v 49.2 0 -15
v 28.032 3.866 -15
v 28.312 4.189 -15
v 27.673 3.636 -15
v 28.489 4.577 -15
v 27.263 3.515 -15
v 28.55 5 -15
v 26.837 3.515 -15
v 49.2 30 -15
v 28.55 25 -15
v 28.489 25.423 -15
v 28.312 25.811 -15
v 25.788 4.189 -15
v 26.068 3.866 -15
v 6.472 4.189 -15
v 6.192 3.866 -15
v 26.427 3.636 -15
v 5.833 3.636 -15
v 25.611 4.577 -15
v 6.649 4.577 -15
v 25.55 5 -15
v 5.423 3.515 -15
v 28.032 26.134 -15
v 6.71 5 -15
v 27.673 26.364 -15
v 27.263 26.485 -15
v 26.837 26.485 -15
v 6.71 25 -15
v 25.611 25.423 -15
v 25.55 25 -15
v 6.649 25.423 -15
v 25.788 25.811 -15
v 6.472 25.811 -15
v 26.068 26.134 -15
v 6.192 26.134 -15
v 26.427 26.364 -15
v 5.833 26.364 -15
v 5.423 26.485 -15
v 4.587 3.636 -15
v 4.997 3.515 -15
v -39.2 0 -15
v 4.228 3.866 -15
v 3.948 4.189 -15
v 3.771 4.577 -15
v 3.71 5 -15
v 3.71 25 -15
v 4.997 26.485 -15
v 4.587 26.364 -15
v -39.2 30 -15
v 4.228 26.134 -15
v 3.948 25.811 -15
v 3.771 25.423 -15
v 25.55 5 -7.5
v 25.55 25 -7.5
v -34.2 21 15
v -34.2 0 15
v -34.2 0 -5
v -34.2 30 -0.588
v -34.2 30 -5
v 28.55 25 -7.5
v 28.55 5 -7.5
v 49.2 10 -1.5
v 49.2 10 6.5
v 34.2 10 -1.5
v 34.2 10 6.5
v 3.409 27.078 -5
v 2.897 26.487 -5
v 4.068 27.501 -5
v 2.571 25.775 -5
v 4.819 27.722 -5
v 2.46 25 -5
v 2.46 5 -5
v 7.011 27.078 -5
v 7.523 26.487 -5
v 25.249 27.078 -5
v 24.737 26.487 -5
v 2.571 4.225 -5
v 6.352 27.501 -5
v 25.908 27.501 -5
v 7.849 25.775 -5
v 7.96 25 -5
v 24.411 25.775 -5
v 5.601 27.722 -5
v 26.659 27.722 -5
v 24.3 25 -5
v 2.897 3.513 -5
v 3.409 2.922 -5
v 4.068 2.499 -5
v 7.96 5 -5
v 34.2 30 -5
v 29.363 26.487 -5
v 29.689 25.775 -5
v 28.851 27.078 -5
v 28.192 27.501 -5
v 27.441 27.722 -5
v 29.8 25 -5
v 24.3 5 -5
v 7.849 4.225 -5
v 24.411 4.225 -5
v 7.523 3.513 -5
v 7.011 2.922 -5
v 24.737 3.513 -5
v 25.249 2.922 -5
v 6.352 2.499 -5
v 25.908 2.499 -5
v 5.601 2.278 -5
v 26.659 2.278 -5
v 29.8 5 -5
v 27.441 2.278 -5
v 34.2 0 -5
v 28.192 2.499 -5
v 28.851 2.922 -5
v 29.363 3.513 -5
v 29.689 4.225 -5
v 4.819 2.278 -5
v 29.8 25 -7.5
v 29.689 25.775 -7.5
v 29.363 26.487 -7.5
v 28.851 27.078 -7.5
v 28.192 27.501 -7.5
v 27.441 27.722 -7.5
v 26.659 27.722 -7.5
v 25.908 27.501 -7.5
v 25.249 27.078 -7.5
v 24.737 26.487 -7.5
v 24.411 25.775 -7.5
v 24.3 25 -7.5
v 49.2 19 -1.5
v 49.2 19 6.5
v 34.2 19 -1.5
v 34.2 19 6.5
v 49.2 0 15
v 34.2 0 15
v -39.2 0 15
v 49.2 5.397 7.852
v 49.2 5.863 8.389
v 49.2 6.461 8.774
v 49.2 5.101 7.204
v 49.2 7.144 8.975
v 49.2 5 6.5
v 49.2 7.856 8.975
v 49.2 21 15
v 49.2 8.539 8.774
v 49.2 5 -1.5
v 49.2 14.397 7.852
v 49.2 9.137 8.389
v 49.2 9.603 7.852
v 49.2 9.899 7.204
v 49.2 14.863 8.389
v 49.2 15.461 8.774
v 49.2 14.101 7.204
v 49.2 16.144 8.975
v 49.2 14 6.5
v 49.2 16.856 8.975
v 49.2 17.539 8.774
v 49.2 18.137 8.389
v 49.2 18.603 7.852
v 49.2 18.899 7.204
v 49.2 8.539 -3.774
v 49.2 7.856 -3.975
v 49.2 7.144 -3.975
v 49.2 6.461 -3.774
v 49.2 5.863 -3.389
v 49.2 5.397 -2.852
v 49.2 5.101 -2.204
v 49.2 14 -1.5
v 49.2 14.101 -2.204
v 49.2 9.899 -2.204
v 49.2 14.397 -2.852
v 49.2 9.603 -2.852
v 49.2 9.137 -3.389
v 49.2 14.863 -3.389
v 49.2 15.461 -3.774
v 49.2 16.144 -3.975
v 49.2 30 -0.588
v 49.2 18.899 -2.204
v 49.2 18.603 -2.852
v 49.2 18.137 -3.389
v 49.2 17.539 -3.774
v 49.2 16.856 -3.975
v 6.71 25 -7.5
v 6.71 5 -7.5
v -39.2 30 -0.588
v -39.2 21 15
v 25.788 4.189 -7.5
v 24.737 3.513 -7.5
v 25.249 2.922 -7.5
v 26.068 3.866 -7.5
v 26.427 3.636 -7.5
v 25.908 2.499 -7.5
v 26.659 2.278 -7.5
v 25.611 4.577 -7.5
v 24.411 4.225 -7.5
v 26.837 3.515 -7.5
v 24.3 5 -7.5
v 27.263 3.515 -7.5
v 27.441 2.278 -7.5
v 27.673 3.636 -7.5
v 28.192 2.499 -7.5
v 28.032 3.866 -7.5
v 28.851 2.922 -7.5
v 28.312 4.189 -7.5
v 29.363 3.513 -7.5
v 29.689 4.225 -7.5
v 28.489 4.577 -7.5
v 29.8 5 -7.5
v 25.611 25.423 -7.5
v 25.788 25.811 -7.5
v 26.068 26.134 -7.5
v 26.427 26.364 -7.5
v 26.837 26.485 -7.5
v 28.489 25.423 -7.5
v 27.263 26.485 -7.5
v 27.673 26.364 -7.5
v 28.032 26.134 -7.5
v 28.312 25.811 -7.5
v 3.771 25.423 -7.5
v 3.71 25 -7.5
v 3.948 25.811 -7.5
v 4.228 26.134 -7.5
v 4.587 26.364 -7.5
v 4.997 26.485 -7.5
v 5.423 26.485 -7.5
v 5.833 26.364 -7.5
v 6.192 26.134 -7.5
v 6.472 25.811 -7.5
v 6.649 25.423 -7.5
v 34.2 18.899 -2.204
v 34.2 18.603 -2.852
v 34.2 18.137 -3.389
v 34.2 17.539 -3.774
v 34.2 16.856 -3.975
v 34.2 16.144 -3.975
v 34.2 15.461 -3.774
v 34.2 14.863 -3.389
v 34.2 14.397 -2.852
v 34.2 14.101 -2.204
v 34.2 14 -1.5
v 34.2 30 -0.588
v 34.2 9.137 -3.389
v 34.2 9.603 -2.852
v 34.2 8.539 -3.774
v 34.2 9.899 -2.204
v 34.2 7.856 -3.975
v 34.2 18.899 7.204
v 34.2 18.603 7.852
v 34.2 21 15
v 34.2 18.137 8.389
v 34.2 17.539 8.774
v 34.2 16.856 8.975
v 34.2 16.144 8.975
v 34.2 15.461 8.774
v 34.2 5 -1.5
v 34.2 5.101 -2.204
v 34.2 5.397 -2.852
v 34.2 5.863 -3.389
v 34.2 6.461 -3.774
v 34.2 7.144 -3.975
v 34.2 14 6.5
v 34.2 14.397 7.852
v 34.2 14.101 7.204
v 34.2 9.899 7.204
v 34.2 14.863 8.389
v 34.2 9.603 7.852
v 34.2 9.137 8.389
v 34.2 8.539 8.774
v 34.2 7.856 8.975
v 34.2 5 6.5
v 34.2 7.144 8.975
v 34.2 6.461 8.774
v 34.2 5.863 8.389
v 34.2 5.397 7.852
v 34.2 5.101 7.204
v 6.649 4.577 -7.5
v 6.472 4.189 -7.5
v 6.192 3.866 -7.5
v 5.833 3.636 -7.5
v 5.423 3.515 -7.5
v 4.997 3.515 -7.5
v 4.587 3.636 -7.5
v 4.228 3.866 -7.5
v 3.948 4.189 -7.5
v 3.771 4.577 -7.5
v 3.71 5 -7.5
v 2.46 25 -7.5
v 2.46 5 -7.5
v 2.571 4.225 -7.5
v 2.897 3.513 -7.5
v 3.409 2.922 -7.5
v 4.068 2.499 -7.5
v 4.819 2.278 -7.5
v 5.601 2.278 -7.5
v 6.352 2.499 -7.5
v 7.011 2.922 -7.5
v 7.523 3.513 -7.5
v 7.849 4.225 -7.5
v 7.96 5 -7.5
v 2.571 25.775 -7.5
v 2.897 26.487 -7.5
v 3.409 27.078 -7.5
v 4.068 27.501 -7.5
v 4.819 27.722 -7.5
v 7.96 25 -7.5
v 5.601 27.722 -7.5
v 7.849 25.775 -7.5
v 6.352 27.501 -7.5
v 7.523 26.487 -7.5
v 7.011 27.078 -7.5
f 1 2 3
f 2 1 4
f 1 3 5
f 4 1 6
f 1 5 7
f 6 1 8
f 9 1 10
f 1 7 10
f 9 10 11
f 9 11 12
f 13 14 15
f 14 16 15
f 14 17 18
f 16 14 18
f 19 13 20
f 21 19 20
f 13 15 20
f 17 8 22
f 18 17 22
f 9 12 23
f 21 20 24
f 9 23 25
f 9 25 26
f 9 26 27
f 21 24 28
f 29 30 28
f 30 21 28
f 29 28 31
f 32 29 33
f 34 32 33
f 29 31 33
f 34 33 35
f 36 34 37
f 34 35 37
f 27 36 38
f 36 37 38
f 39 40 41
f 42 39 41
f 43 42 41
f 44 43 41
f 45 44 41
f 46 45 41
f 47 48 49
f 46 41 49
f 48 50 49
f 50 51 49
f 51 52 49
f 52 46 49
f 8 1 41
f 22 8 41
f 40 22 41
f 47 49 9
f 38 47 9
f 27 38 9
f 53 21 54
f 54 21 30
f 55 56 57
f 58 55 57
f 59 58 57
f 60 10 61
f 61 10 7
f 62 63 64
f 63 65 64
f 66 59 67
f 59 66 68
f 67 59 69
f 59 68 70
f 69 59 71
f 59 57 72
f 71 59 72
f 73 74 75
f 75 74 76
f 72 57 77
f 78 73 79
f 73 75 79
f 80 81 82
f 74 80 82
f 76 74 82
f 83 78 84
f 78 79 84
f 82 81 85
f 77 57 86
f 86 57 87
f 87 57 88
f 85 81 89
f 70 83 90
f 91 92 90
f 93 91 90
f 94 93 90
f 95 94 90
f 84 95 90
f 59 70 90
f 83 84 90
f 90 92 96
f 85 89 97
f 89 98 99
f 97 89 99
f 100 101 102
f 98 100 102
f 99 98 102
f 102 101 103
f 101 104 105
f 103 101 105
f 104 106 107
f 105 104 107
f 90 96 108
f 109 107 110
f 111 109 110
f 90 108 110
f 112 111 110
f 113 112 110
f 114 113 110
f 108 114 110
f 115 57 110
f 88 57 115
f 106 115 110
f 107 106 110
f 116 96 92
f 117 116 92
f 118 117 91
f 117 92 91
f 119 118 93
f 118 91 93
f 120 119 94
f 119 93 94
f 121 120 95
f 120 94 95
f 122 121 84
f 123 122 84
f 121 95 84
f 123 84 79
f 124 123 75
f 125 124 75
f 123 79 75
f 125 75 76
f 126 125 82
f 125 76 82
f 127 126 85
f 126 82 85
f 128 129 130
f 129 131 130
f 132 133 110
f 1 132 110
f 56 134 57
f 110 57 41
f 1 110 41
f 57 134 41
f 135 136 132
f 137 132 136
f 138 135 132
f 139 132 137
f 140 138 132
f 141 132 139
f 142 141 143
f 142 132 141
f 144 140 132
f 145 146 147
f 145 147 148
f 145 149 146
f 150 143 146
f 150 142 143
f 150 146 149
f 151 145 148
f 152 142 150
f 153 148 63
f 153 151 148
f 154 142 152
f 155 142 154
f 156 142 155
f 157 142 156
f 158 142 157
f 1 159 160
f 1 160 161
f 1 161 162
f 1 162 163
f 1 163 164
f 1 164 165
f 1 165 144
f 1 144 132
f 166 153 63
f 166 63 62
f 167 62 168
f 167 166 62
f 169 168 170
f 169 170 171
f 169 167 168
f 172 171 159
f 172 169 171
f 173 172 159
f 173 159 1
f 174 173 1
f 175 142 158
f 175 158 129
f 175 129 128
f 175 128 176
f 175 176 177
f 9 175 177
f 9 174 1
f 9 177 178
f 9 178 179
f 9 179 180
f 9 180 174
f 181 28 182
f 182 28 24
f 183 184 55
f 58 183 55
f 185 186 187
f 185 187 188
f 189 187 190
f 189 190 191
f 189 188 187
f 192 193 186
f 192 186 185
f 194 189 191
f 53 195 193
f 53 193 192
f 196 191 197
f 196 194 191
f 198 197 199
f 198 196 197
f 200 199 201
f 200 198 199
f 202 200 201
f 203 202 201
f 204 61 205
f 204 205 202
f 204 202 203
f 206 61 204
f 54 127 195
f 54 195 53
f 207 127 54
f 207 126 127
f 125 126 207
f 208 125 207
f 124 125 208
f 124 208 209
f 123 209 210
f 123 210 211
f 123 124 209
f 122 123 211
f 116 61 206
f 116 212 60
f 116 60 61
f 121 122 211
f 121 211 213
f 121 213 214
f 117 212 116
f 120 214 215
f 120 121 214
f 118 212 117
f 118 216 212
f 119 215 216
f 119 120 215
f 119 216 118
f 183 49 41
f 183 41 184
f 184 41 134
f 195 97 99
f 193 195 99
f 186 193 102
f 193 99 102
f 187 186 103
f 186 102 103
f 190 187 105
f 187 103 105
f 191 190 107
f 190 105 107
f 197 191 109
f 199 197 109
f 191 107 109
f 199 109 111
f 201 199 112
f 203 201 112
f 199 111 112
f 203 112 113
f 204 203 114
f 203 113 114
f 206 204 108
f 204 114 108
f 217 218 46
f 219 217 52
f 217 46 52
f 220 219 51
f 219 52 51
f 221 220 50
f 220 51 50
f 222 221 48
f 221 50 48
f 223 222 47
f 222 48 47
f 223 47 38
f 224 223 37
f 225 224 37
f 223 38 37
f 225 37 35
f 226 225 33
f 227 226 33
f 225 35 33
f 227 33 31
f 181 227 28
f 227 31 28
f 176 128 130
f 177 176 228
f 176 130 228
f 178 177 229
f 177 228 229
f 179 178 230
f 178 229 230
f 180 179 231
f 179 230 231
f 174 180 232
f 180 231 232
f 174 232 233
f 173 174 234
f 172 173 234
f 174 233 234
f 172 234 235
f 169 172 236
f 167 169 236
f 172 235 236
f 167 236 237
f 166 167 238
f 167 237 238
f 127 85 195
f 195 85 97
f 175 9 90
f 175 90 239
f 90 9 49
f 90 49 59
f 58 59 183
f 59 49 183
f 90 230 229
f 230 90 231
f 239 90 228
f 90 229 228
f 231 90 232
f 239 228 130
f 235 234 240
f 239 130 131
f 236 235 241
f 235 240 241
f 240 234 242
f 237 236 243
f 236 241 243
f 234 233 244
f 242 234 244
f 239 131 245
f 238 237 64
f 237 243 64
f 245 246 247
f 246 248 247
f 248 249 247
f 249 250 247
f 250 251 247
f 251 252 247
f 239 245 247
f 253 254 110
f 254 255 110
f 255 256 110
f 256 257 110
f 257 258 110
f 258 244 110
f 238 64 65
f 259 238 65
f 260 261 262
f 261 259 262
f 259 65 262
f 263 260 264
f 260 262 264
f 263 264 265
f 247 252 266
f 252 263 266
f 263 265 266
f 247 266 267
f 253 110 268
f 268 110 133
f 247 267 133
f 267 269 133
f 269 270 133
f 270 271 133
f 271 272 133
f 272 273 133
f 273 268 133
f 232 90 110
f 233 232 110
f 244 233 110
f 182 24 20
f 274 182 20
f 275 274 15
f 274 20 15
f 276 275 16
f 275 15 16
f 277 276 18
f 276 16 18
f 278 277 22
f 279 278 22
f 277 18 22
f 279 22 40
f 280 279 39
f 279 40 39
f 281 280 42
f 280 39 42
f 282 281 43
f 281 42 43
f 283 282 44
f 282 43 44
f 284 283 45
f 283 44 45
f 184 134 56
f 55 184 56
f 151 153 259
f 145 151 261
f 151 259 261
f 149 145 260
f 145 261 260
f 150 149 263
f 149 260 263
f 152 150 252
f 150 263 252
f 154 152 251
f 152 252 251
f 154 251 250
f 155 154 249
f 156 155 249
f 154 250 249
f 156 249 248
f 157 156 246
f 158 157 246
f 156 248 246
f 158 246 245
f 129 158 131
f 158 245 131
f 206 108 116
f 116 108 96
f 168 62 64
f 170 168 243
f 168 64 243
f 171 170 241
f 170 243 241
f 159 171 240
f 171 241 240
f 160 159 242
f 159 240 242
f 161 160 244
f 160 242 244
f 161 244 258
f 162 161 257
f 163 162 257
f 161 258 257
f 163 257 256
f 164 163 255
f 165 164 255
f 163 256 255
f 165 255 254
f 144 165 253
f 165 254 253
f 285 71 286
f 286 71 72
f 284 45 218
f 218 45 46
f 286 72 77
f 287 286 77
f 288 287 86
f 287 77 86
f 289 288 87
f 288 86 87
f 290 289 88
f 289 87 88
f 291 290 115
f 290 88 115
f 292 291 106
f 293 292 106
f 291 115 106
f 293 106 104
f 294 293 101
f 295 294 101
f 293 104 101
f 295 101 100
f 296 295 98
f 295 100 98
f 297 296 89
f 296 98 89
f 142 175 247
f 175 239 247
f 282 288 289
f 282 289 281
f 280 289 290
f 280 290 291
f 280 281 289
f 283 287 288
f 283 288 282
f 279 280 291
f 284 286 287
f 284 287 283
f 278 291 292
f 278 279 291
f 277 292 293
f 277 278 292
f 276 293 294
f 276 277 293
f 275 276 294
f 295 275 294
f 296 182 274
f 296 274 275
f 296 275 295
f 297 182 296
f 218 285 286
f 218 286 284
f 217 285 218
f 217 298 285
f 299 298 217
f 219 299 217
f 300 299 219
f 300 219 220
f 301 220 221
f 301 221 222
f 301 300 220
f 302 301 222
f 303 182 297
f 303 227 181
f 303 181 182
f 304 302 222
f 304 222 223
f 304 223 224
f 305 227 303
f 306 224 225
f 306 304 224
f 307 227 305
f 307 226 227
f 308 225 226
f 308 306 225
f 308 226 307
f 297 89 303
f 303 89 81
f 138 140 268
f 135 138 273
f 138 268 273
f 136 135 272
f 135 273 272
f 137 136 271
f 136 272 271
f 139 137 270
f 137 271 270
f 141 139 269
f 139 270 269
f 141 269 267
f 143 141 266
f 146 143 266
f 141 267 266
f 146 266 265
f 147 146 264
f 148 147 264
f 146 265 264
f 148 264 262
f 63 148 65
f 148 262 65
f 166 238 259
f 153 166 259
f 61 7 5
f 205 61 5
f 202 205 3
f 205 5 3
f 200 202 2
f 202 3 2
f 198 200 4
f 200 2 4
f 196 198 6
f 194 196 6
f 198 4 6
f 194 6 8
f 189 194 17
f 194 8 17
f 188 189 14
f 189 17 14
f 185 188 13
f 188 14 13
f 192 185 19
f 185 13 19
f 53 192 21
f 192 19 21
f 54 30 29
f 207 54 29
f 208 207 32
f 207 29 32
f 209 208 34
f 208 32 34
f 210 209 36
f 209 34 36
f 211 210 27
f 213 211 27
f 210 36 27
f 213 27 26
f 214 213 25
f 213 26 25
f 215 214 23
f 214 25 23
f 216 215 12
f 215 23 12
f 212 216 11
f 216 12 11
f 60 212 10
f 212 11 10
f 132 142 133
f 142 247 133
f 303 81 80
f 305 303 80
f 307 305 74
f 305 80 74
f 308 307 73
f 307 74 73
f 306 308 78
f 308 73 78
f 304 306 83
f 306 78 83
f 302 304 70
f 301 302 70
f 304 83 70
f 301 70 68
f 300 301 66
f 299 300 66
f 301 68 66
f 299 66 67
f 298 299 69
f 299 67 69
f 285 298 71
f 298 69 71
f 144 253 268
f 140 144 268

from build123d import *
from OCP.BRepFilletAPI import BRepFilletAPI_MakeChamfer

# Parameters (mm, degrees)
BOSS_EXTRUDE1_DEPTH = 30
CUT_EXTRUDE1_REACH  = 87.273
CHAMFER1_SIZE       = 9
CHAMFER1_SIZE2      = 15.588457268
BOSS_EXTRUDE8_DEPTH = 10
CUT_EXTRUDE2_REACH  = 66.966
CUT_EXTRUDE3_DEPTH  = 2.5


with BuildPart() as part:
    # Sketch1 → Boss-Extrude1 (new body)
    with BuildSketch(Plane(origin=(0, 0, 0), x_dir=(1, 0, 0), z_dir=(0, 1, 0))):
        Polygon((39.2, 15), (-39.2, 15), (-39.2, -15), (-34.2, -15), (-34.2, 5), (34.2, 5), (34.2, -15), (39.2, -15), align=None)
    extrude(amount=BOSS_EXTRUDE1_DEPTH)

    # Sketch2 → Cut-Extrude1 (cut, up to next)
    with BuildSketch(Plane(origin=(39.2, 0, 0), x_dir=(0, 0, -1), z_dir=(1, 0, 0)), mode=Mode.PRIVATE) as cut_extrude1_sk1:
        with BuildLine():
            Line((-6.5, 10), (1.5, 10))
            ThreePointArc((1.5, 10), (4, 7.5), (1.5, 5))
            Line((1.5, 5), (-6.5, 5))
            ThreePointArc((-6.5, 5), (-9, 7.5), (-6.5, 10))
        make_face()
    cut_extrude1_tool1 = extrude(cut_extrude1_sk1.sketch, amount=-CUT_EXTRUDE1_REACH, mode=Mode.PRIVATE) & part.part
    # Sketch2 → Cut-Extrude1 (cut, up to next)
    with BuildSketch(Plane(origin=(39.2, 0, 0), x_dir=(0, 0, -1), z_dir=(1, 0, 0)), mode=Mode.PRIVATE) as cut_extrude1_sk2:
        with BuildLine():
            Line((-6.5, 19), (1.5, 19))
            ThreePointArc((1.5, 19), (4, 16.5), (1.5, 14))
            Line((1.5, 14), (-6.5, 14))
            ThreePointArc((-6.5, 14), (-9, 16.5), (-6.5, 19))
        make_face()
    cut_extrude1_tool2 = extrude(cut_extrude1_sk2.sketch, amount=-CUT_EXTRUDE1_REACH, mode=Mode.PRIVATE) & part.part
    add(cut_extrude1_tool1.solids().sort_by_distance((39.2, 7.5, 2.5))[0], mode=Mode.SUBTRACT)
    add(cut_extrude1_tool2.solids().sort_by_distance((39.2, 16.5, 2.5))[0], mode=Mode.SUBTRACT)

    # Chamfer1: one chamfer whose edges measure the first distance from different faces: ONE call of the kernel's chamfer builder (chamfer() names one face for all edges)
    chamfer1_edges_1 = [part.edges().sort_by_distance(p)[0] for p in [
        (36.7, 30, 15),
    ]]
    chamfer1_side_1 = [part.faces().sort_by_distance(p)[0] for p in [
        (36.7, 15, 15),
    ]]
    chamfer1_edges_2 = [part.edges().sort_by_distance(p)[0] for p in [
        (-36.7, 30, 15),
    ]]
    chamfer1_side_2 = [part.faces().sort_by_distance(p)[0] for p in [
        (-36.7, 15, 15),
    ]]
    chamfer1 = BRepFilletAPI_MakeChamfer(part.part.solid().wrapped)
    for e in chamfer1_edges_1:
        chamfer1.Add(CHAMFER1_SIZE, CHAMFER1_SIZE2, e.wrapped, chamfer1_side_1[0].wrapped)  # the first distance lies on this face
    for e in chamfer1_edges_2:
        chamfer1.Add(CHAMFER1_SIZE, CHAMFER1_SIZE2, e.wrapped, chamfer1_side_2[0].wrapped)  # the first distance lies on this face
    add(Compound.cast(chamfer1.Shape()), mode=Mode.REPLACE)

    # Sketch8 → Boss-Extrude8 (add)
    with BuildSketch(Plane(origin=(39.2, 0, 0), x_dir=(0, 0, -1), z_dir=(1, 0, 0))):
        Polygon((15, 30), (0.588457268, 30), (-15, 21), (-15, 0), (15, 0), align=None)
        with BuildLine():
            Line((-6.5, 19), (1.5, 19))
            ThreePointArc((1.5, 19), (4, 16.5), (1.5, 14))
            Line((1.5, 14), (-6.5, 14))
            ThreePointArc((-6.5, 14), (-9, 16.5), (-6.5, 19))
        make_face(mode=Mode.SUBTRACT)
        with BuildLine():
            Line((-6.5, 10), (1.5, 10))
            ThreePointArc((1.5, 10), (4, 7.5), (1.5, 5))
            Line((1.5, 5), (-6.5, 5))
            ThreePointArc((-6.5, 5), (-9, 7.5), (-6.5, 10))
        make_face(mode=Mode.SUBTRACT)
    extrude(amount=BOSS_EXTRUDE8_DEPTH)

    # Sketch9 → Cut-Extrude2 (cut, up to next)
    with BuildSketch(Plane(origin=(0, 0, -15), x_dir=(-1, 0, 0), z_dir=(0, 0, -1)), mode=Mode.PRIVATE) as cut_extrude2_sk1:
        with BuildLine():
            ThreePointArc((-25.55, 25), (-27.05, 23.5), (-28.55, 25))
            Line((-28.55, 25), (-28.55, 5))
            ThreePointArc((-28.55, 5), (-27.05, 6.5), (-25.55, 5))
            Line((-25.55, 5), (-25.55, 25))
        make_face()
    cut_extrude2_tool1 = extrude(cut_extrude2_sk1.sketch, amount=-CUT_EXTRUDE2_REACH, mode=Mode.PRIVATE) & part.part
    # Sketch9 → Cut-Extrude2 (cut, up to next)
    with BuildSketch(Plane(origin=(0, 0, -15), x_dir=(-1, 0, 0), z_dir=(0, 0, -1)), mode=Mode.PRIVATE) as cut_extrude2_sk2:
        with BuildLine():
            ThreePointArc((-25.55, 25), (-27.05, 26.5), (-28.55, 25))
            Line((-28.55, 25), (-25.55, 25))
        make_face()
    cut_extrude2_tool2 = extrude(cut_extrude2_sk2.sketch, amount=-CUT_EXTRUDE2_REACH, mode=Mode.PRIVATE) & part.part
    # Sketch9 → Cut-Extrude2 (cut, up to next)
    with BuildSketch(Plane(origin=(0, 0, -15), x_dir=(-1, 0, 0), z_dir=(0, 0, -1)), mode=Mode.PRIVATE) as cut_extrude2_sk3:
        with BuildLine():
            Line((-25.55, 25), (-28.55, 25))
            ThreePointArc((-28.55, 25), (-27.05, 23.5), (-25.55, 25))
        make_face()
    cut_extrude2_tool3 = extrude(cut_extrude2_sk3.sketch, amount=-CUT_EXTRUDE2_REACH, mode=Mode.PRIVATE) & part.part
    # Sketch9 → Cut-Extrude2 (cut, up to next)
    with BuildSketch(Plane(origin=(0, 0, -15), x_dir=(-1, 0, 0), z_dir=(0, 0, -1)), mode=Mode.PRIVATE) as cut_extrude2_sk4:
        with BuildLine():
            ThreePointArc((-3.71, 25), (-5.21, 26.5), (-6.71, 25))
            Line((-6.71, 25), (-3.71, 25))
        make_face()
    cut_extrude2_tool4 = extrude(cut_extrude2_sk4.sketch, amount=-CUT_EXTRUDE2_REACH, mode=Mode.PRIVATE) & part.part
    # Sketch9 → Cut-Extrude2 (cut, up to next)
    with BuildSketch(Plane(origin=(0, 0, -15), x_dir=(-1, 0, 0), z_dir=(0, 0, -1)), mode=Mode.PRIVATE) as cut_extrude2_sk5:
        with BuildLine():
            Line((-3.71, 25), (-6.71, 25))
            ThreePointArc((-6.71, 25), (-5.21, 23.5), (-3.71, 25))
        make_face()
    cut_extrude2_tool5 = extrude(cut_extrude2_sk5.sketch, amount=-CUT_EXTRUDE2_REACH, mode=Mode.PRIVATE) & part.part
    # Sketch9 → Cut-Extrude2 (cut, up to next)
    with BuildSketch(Plane(origin=(0, 0, -15), x_dir=(-1, 0, 0), z_dir=(0, 0, -1)), mode=Mode.PRIVATE) as cut_extrude2_sk6:
        with BuildLine():
            ThreePointArc((-3.71, 25), (-5.21, 23.5), (-6.71, 25))
            Line((-6.71, 25), (-6.71, 5))
            ThreePointArc((-6.71, 5), (-5.21, 6.5), (-3.71, 5))
            Line((-3.71, 5), (-3.71, 25))
        make_face()
    cut_extrude2_tool6 = extrude(cut_extrude2_sk6.sketch, amount=-CUT_EXTRUDE2_REACH, mode=Mode.PRIVATE) & part.part
    # Sketch9 → Cut-Extrude2 (cut, up to next)
    with BuildSketch(Plane(origin=(0, 0, -15), x_dir=(-1, 0, 0), z_dir=(0, 0, -1)), mode=Mode.PRIVATE) as cut_extrude2_sk7:
        with BuildLine():
            ThreePointArc((-3.71, 25), (-5.21, 26.5), (-6.71, 25))
            Line((-6.71, 25), (-3.71, 25))
        make_face()
    cut_extrude2_tool7 = extrude(cut_extrude2_sk7.sketch, amount=-CUT_EXTRUDE2_REACH, mode=Mode.PRIVATE) & part.part
    # Sketch9 → Cut-Extrude2 (cut, up to next)
    with BuildSketch(Plane(origin=(0, 0, -15), x_dir=(-1, 0, 0), z_dir=(0, 0, -1)), mode=Mode.PRIVATE) as cut_extrude2_sk8:
        with BuildLine():
            Line((-3.71, 25), (-6.71, 25))
            ThreePointArc((-6.71, 25), (-5.21, 23.5), (-3.71, 25))
        make_face()
    cut_extrude2_tool8 = extrude(cut_extrude2_sk8.sketch, amount=-CUT_EXTRUDE2_REACH, mode=Mode.PRIVATE) & part.part
    # Sketch9 → Cut-Extrude2 (cut, up to next)
    with BuildSketch(Plane(origin=(0, 0, -15), x_dir=(-1, 0, 0), z_dir=(0, 0, -1)), mode=Mode.PRIVATE) as cut_extrude2_sk9:
        with BuildLine():
            ThreePointArc((-25.55, 25), (-27.05, 26.5), (-28.55, 25))
            Line((-28.55, 25), (-25.55, 25))
        make_face()
    cut_extrude2_tool9 = extrude(cut_extrude2_sk9.sketch, amount=-CUT_EXTRUDE2_REACH, mode=Mode.PRIVATE) & part.part
    # Sketch9 → Cut-Extrude2 (cut, up to next)
    with BuildSketch(Plane(origin=(0, 0, -15), x_dir=(-1, 0, 0), z_dir=(0, 0, -1)), mode=Mode.PRIVATE) as cut_extrude2_sk10:
        with BuildLine():
            Line((-25.55, 25), (-28.55, 25))
            ThreePointArc((-28.55, 25), (-27.05, 23.5), (-25.55, 25))
        make_face()
    cut_extrude2_tool10 = extrude(cut_extrude2_sk10.sketch, amount=-CUT_EXTRUDE2_REACH, mode=Mode.PRIVATE) & part.part
    # Sketch9 → Cut-Extrude2 (cut, up to next)
    with BuildSketch(Plane(origin=(0, 0, -15), x_dir=(-1, 0, 0), z_dir=(0, 0, -1)), mode=Mode.PRIVATE) as cut_extrude2_sk11:
        with BuildLine():
            ThreePointArc((-25.55, 5), (-27.05, 6.5), (-28.55, 5))
            Line((-28.55, 5), (-25.55, 5))
        make_face()
    cut_extrude2_tool11 = extrude(cut_extrude2_sk11.sketch, amount=-CUT_EXTRUDE2_REACH, mode=Mode.PRIVATE) & part.part
    # Sketch9 → Cut-Extrude2 (cut, up to next)
    with BuildSketch(Plane(origin=(0, 0, -15), x_dir=(-1, 0, 0), z_dir=(0, 0, -1)), mode=Mode.PRIVATE) as cut_extrude2_sk12:
        with BuildLine():
            Line((-25.55, 5), (-28.55, 5))
            ThreePointArc((-28.55, 5), (-27.05, 3.5), (-25.55, 5))
        make_face()
    cut_extrude2_tool12 = extrude(cut_extrude2_sk12.sketch, amount=-CUT_EXTRUDE2_REACH, mode=Mode.PRIVATE) & part.part
    # Sketch9 → Cut-Extrude2 (cut, up to next)
    with BuildSketch(Plane(origin=(0, 0, -15), x_dir=(-1, 0, 0), z_dir=(0, 0, -1)), mode=Mode.PRIVATE) as cut_extrude2_sk13:
        with BuildLine():
            ThreePointArc((-25.55, 5), (-27.05, 6.5), (-28.55, 5))
            Line((-28.55, 5), (-25.55, 5))
        make_face()
    cut_extrude2_tool13 = extrude(cut_extrude2_sk13.sketch, amount=-CUT_EXTRUDE2_REACH, mode=Mode.PRIVATE) & part.part
    # Sketch9 → Cut-Extrude2 (cut, up to next)
    with BuildSketch(Plane(origin=(0, 0, -15), x_dir=(-1, 0, 0), z_dir=(0, 0, -1)), mode=Mode.PRIVATE) as cut_extrude2_sk14:
        with BuildLine():
            Line((-25.55, 5), (-28.55, 5))
            ThreePointArc((-28.55, 5), (-27.05, 3.5), (-25.55, 5))
        make_face()
    cut_extrude2_tool14 = extrude(cut_extrude2_sk14.sketch, amount=-CUT_EXTRUDE2_REACH, mode=Mode.PRIVATE) & part.part
    # Sketch9 → Cut-Extrude2 (cut, up to next)
    with BuildSketch(Plane(origin=(0, 0, -15), x_dir=(-1, 0, 0), z_dir=(0, 0, -1)), mode=Mode.PRIVATE) as cut_extrude2_sk15:
        with BuildLine():
            ThreePointArc((-3.71, 5), (-5.21, 6.5), (-6.71, 5))
            Line((-6.71, 5), (-3.71, 5))
        make_face()
    cut_extrude2_tool15 = extrude(cut_extrude2_sk15.sketch, amount=-CUT_EXTRUDE2_REACH, mode=Mode.PRIVATE) & part.part
    # Sketch9 → Cut-Extrude2 (cut, up to next)
    with BuildSketch(Plane(origin=(0, 0, -15), x_dir=(-1, 0, 0), z_dir=(0, 0, -1)), mode=Mode.PRIVATE) as cut_extrude2_sk16:
        with BuildLine():
            Line((-3.71, 5), (-6.71, 5))
            ThreePointArc((-6.71, 5), (-5.21, 3.5), (-3.71, 5))
        make_face()
    cut_extrude2_tool16 = extrude(cut_extrude2_sk16.sketch, amount=-CUT_EXTRUDE2_REACH, mode=Mode.PRIVATE) & part.part
    # Sketch9 → Cut-Extrude2 (cut, up to next)
    with BuildSketch(Plane(origin=(0, 0, -15), x_dir=(-1, 0, 0), z_dir=(0, 0, -1)), mode=Mode.PRIVATE) as cut_extrude2_sk17:
        with BuildLine():
            ThreePointArc((-3.71, 5), (-5.21, 6.5), (-6.71, 5))
            Line((-6.71, 5), (-3.71, 5))
        make_face()
    cut_extrude2_tool17 = extrude(cut_extrude2_sk17.sketch, amount=-CUT_EXTRUDE2_REACH, mode=Mode.PRIVATE) & part.part
    # Sketch9 → Cut-Extrude2 (cut, up to next)
    with BuildSketch(Plane(origin=(0, 0, -15), x_dir=(-1, 0, 0), z_dir=(0, 0, -1)), mode=Mode.PRIVATE) as cut_extrude2_sk18:
        with BuildLine():
            Line((-3.71, 5), (-6.71, 5))
            ThreePointArc((-6.71, 5), (-5.21, 3.5), (-3.71, 5))
        make_face()
    cut_extrude2_tool18 = extrude(cut_extrude2_sk18.sketch, amount=-CUT_EXTRUDE2_REACH, mode=Mode.PRIVATE) & part.part
    add(cut_extrude2_tool1.solids().sort_by_distance((27.05, 15, -15))[0], mode=Mode.SUBTRACT)
    add(cut_extrude2_tool2.solids().sort_by_distance((27.05, 25.63662, -15))[0], mode=Mode.SUBTRACT)
    add(cut_extrude2_tool3.solids().sort_by_distance((27.05, 24.36338, -15))[0], mode=Mode.SUBTRACT)
    add(cut_extrude2_tool4.solids().sort_by_distance((5.21, 25.63662, -15))[0], mode=Mode.SUBTRACT)
    add(cut_extrude2_tool5.solids().sort_by_distance((5.21, 24.36338, -15))[0], mode=Mode.SUBTRACT)
    add(cut_extrude2_tool6.solids().sort_by_distance((5.21, 15, -15))[0], mode=Mode.SUBTRACT)
    add(cut_extrude2_tool7.solids().sort_by_distance((5.21, 25.63662, -15))[0], mode=Mode.SUBTRACT)
    add(cut_extrude2_tool8.solids().sort_by_distance((5.21, 24.36338, -15))[0], mode=Mode.SUBTRACT)
    add(cut_extrude2_tool9.solids().sort_by_distance((27.05, 25.63662, -15))[0], mode=Mode.SUBTRACT)
    add(cut_extrude2_tool10.solids().sort_by_distance((27.05, 24.36338, -15))[0], mode=Mode.SUBTRACT)
    add(cut_extrude2_tool11.solids().sort_by_distance((27.05, 5.63662, -15))[0], mode=Mode.SUBTRACT)
    add(cut_extrude2_tool12.solids().sort_by_distance((27.05, 4.36338, -15))[0], mode=Mode.SUBTRACT)
    add(cut_extrude2_tool13.solids().sort_by_distance((27.05, 5.63662, -15))[0], mode=Mode.SUBTRACT)
    add(cut_extrude2_tool14.solids().sort_by_distance((27.05, 4.36338, -15))[0], mode=Mode.SUBTRACT)
    add(cut_extrude2_tool15.solids().sort_by_distance((5.21, 5.63662, -15))[0], mode=Mode.SUBTRACT)
    add(cut_extrude2_tool16.solids().sort_by_distance((5.21, 4.36338, -15))[0], mode=Mode.SUBTRACT)
    add(cut_extrude2_tool17.solids().sort_by_distance((5.21, 5.63662, -15))[0], mode=Mode.SUBTRACT)
    add(cut_extrude2_tool18.solids().sort_by_distance((5.21, 4.36338, -15))[0], mode=Mode.SUBTRACT)

    # Sketch10 → Cut-Extrude3 (cut)
    with BuildSketch(Plane.XY.offset(-5)):
        with BuildLine():
            Line((7.96, 5), (7.96, 25))
            ThreePointArc((7.96, 25), (5.21, 27.75), (2.46, 25))
            Line((2.46, 25), (2.46, 5))
            ThreePointArc((2.46, 5), (5.21, 2.25), (7.96, 5))
        make_face()
        with BuildLine():
            ThreePointArc((3.71, 25), (5.21, 26.5), (6.71, 25))
            Line((6.71, 25), (6.71, 5))
            ThreePointArc((6.71, 5), (5.21, 3.5), (3.71, 5))
            Line((3.71, 5), (3.71, 25))
        make_face(mode=Mode.SUBTRACT)
        with BuildLine():
            Line((29.8, 5), (29.8, 25))
            ThreePointArc((29.8, 25), (27.05, 27.75), (24.3, 25))
            Line((24.3, 25), (24.3, 5))
            ThreePointArc((24.3, 5), (27.05, 2.25), (29.8, 5))
        make_face()
        with BuildLine():
            ThreePointArc((25.55, 25), (27.05, 26.5), (28.55, 25))
            Line((28.55, 25), (28.55, 5))
            ThreePointArc((28.55, 5), (27.05, 3.5), (25.55, 5))
            Line((25.55, 5), (25.55, 25))
        make_face(mode=Mode.SUBTRACT)
    extrude(amount=-CUT_EXTRUDE3_DEPTH, mode=Mode.SUBTRACT)


solid = part.part
